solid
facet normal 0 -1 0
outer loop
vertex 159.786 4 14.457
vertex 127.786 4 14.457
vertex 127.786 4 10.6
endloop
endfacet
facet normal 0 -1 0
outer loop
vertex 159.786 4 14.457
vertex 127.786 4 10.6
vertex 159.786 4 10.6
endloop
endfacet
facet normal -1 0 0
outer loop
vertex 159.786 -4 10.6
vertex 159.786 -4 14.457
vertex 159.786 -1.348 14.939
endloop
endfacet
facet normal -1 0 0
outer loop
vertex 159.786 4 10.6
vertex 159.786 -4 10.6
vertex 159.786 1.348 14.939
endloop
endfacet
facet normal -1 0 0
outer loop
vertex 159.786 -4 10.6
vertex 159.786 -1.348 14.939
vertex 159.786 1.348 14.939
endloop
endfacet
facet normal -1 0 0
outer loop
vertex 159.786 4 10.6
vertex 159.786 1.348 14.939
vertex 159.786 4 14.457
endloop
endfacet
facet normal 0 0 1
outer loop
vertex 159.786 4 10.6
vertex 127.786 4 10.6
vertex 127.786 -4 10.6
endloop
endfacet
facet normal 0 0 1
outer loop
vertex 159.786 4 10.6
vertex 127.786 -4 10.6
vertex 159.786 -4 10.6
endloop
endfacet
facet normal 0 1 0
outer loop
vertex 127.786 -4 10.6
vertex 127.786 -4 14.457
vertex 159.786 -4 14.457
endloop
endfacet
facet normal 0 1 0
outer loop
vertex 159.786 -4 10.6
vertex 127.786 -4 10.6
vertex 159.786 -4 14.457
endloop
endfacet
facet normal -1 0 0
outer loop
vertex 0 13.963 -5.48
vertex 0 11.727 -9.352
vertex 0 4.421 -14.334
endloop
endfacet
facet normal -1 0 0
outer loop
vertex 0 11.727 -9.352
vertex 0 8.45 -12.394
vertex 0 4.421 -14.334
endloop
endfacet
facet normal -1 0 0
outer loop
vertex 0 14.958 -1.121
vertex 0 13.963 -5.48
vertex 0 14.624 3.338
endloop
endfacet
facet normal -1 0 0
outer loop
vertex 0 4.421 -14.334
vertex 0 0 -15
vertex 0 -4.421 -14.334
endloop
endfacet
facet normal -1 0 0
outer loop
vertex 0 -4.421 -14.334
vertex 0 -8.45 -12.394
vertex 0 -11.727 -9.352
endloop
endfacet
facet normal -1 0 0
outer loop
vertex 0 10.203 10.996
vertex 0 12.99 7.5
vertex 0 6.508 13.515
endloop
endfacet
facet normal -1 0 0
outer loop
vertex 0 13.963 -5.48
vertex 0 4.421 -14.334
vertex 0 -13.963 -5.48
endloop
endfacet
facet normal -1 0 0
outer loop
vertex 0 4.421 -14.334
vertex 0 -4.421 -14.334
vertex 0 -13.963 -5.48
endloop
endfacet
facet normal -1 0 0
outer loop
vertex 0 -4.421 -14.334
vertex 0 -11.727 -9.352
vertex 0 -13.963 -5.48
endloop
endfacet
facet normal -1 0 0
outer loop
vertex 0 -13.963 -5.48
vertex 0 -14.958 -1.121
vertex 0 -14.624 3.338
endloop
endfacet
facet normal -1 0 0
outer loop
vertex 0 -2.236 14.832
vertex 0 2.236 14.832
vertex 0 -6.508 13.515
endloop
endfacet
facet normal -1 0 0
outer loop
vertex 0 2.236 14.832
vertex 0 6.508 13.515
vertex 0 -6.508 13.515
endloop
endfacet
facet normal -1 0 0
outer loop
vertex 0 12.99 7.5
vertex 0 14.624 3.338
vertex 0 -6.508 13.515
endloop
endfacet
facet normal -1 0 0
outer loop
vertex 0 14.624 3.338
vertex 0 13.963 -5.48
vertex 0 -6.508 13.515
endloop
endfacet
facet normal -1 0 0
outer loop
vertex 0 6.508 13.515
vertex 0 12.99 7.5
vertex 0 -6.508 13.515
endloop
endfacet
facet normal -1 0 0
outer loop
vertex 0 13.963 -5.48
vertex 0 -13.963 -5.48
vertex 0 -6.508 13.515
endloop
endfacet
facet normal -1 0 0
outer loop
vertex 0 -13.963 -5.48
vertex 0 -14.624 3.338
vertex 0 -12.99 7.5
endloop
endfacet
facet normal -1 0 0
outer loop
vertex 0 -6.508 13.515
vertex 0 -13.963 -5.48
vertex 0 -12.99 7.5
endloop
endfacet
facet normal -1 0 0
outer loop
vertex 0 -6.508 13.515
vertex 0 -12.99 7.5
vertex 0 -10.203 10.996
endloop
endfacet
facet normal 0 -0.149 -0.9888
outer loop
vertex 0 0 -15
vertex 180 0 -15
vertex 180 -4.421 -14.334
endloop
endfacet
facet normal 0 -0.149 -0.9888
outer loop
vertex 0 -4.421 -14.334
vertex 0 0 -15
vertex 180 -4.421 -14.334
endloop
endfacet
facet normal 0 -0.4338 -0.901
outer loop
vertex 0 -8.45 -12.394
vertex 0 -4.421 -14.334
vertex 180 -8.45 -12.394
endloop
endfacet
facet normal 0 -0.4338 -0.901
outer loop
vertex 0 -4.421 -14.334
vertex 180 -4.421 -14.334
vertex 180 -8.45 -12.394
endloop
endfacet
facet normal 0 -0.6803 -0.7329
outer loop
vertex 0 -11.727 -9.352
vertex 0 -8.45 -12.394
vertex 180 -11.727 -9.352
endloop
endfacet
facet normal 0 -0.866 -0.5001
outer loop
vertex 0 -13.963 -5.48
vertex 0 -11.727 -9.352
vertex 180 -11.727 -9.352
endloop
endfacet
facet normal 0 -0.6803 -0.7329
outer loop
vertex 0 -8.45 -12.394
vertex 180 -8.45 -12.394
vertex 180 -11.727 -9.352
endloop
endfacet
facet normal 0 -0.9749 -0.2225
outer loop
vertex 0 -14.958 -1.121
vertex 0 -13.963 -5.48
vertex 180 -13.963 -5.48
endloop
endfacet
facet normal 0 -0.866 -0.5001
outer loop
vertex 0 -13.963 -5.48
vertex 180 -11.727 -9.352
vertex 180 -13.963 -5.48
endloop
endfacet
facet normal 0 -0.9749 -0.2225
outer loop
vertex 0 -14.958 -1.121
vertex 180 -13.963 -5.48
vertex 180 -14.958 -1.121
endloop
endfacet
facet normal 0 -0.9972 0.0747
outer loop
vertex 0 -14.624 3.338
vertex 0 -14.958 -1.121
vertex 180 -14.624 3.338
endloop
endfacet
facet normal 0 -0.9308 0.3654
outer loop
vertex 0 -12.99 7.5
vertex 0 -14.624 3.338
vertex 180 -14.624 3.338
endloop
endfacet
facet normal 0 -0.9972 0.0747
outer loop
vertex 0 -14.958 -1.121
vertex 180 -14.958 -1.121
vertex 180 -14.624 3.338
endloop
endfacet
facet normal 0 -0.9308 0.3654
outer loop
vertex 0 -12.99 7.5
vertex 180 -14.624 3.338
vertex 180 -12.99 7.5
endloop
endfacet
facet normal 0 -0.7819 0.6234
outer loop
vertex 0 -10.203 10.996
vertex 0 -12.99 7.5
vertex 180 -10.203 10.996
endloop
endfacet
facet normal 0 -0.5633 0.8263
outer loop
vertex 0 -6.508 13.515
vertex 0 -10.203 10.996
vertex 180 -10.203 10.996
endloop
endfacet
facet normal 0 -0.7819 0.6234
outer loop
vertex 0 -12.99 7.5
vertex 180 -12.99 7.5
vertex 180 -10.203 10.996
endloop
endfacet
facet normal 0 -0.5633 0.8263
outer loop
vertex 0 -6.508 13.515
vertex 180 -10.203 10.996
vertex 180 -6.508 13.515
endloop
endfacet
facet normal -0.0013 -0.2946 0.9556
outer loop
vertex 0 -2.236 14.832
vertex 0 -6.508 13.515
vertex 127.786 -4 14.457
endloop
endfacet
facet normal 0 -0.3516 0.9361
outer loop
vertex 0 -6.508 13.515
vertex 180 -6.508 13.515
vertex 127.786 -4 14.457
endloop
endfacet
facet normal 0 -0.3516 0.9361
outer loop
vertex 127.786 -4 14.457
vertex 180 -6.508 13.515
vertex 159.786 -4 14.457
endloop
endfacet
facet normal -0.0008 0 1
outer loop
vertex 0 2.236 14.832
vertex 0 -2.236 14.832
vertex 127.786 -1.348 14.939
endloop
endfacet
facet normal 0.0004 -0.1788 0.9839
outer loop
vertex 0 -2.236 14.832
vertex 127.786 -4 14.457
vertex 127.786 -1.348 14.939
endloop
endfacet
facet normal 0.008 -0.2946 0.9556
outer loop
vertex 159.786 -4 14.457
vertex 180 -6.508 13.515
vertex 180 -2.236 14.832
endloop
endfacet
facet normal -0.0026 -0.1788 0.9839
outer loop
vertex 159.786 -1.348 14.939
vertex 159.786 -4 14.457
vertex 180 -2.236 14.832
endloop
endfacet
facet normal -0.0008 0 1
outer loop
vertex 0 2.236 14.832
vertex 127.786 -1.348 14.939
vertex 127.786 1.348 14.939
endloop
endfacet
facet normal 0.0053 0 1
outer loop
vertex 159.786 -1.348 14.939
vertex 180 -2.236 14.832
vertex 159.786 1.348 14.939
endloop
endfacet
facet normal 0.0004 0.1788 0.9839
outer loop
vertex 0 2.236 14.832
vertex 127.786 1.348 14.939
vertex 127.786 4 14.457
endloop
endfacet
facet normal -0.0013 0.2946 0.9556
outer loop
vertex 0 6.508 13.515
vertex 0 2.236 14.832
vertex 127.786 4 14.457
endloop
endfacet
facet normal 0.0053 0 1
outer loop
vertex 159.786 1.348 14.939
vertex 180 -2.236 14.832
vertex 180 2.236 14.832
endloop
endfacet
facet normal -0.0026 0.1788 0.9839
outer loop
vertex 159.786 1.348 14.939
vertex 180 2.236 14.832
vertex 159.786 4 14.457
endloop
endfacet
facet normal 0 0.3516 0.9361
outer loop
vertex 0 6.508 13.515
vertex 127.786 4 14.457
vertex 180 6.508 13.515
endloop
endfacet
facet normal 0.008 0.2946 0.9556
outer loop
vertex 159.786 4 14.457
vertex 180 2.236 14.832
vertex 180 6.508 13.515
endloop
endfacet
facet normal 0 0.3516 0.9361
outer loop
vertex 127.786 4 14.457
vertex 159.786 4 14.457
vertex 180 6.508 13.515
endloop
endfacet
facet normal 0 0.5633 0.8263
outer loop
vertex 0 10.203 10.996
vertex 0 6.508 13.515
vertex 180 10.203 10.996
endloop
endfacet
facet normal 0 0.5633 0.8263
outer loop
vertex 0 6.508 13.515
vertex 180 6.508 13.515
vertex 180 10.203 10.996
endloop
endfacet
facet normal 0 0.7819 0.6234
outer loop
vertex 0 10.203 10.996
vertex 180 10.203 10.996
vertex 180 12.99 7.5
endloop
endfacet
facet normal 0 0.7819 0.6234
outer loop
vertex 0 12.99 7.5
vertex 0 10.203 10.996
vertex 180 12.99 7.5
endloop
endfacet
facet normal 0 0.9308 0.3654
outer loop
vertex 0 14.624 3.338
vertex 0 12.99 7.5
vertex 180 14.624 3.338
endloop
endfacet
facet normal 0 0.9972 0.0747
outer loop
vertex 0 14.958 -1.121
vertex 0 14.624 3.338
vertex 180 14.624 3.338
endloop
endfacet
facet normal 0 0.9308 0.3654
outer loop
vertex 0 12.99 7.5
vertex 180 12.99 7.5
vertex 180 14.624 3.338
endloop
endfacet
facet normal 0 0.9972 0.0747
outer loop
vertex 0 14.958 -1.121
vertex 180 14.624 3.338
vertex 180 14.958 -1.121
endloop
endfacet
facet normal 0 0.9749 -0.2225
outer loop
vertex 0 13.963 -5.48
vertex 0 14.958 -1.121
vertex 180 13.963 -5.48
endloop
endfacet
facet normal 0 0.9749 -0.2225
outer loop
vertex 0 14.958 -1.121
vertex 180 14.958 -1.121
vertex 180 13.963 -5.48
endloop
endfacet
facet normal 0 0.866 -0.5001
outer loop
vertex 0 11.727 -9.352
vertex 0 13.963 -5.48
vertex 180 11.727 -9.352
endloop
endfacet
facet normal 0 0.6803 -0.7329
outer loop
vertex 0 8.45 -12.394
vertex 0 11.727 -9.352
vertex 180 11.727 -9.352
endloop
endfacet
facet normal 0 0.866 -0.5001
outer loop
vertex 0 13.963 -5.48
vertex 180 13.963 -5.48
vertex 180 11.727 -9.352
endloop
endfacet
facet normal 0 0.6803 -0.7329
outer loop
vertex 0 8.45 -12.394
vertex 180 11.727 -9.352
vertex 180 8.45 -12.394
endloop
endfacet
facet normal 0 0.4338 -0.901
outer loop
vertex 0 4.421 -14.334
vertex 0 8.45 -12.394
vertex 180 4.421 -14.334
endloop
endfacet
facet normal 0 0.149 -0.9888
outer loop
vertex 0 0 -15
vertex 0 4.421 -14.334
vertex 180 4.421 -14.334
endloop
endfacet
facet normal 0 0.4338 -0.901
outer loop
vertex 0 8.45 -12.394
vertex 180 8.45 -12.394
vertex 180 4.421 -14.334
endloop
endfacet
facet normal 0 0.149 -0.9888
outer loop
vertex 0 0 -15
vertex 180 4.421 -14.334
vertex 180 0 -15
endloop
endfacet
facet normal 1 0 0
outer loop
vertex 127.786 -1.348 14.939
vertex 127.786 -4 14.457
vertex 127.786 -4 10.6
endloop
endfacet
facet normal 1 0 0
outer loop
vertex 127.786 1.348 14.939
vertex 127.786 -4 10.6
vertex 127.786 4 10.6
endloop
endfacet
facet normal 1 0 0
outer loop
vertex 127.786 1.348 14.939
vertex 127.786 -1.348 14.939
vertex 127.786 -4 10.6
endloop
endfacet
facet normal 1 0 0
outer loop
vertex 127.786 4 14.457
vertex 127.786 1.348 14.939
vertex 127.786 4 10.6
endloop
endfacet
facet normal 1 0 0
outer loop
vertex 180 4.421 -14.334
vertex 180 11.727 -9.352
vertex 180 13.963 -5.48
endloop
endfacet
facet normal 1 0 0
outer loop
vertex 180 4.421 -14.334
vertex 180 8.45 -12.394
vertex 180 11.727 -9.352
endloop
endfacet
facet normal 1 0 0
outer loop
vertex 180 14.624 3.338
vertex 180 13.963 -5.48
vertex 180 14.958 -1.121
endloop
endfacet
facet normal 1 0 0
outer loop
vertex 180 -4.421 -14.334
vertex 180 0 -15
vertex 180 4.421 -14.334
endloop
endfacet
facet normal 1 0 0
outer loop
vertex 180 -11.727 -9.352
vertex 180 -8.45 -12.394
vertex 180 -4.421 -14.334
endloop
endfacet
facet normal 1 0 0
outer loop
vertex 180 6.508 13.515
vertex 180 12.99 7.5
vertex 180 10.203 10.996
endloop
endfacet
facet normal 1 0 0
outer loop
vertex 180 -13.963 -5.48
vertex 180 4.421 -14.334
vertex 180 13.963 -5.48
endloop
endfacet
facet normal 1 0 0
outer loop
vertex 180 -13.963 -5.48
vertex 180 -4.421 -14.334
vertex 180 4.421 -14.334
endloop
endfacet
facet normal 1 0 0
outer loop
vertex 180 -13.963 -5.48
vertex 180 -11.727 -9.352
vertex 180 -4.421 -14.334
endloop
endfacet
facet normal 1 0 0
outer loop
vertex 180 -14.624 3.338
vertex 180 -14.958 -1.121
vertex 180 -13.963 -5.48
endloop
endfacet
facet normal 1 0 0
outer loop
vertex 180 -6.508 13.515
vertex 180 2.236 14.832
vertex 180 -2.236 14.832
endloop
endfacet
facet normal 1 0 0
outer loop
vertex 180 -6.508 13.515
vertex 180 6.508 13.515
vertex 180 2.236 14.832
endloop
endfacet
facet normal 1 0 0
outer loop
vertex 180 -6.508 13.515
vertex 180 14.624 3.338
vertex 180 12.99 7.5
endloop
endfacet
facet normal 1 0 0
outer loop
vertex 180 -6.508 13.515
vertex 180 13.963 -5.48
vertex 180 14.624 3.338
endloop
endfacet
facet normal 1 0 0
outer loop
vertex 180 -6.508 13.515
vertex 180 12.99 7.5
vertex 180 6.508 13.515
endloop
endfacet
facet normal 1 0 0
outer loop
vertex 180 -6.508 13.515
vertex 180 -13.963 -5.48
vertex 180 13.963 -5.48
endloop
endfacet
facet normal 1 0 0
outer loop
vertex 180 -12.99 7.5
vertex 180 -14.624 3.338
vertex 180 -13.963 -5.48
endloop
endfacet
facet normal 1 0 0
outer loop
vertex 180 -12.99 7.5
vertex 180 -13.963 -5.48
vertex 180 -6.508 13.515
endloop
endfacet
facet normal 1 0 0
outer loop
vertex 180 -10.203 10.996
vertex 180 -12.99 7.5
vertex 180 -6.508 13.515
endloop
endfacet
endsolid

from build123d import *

# Parameters (mm, degrees)
SKETCH2_W          = 180
SKETCH2_H          = 15
SKETCH3_W          = 32
SKETCH3_H          = 8
CUT_EXTRUDE1_DEPTH = 4.4


with BuildPart() as part:
    # Sketch2 → Revolve1 (revolve)
    with BuildSketch(Plane.XY, mode=Mode.PRIVATE) as revolve1_sk:
        with Locations((90, 7.5)):
            Rectangle(SKETCH2_W, SKETCH2_H)
    revolve(revolve1_sk.sketch.rotate(Axis((0, 0, 0), (-1, 0, 0)), 90), axis=Axis((0, 0, 0), (-1, 0, 0)))

    # Sketch3 → Cut-Extrude1 (cut)
    with BuildSketch(Plane.XY.offset(15)):
        with Locations((143.786391812, 0)):
            Rectangle(SKETCH3_W, SKETCH3_H)
    extrude(amount=-CUT_EXTRUDE1_DEPTH, mode=Mode.SUBTRACT)


solid = part.part
